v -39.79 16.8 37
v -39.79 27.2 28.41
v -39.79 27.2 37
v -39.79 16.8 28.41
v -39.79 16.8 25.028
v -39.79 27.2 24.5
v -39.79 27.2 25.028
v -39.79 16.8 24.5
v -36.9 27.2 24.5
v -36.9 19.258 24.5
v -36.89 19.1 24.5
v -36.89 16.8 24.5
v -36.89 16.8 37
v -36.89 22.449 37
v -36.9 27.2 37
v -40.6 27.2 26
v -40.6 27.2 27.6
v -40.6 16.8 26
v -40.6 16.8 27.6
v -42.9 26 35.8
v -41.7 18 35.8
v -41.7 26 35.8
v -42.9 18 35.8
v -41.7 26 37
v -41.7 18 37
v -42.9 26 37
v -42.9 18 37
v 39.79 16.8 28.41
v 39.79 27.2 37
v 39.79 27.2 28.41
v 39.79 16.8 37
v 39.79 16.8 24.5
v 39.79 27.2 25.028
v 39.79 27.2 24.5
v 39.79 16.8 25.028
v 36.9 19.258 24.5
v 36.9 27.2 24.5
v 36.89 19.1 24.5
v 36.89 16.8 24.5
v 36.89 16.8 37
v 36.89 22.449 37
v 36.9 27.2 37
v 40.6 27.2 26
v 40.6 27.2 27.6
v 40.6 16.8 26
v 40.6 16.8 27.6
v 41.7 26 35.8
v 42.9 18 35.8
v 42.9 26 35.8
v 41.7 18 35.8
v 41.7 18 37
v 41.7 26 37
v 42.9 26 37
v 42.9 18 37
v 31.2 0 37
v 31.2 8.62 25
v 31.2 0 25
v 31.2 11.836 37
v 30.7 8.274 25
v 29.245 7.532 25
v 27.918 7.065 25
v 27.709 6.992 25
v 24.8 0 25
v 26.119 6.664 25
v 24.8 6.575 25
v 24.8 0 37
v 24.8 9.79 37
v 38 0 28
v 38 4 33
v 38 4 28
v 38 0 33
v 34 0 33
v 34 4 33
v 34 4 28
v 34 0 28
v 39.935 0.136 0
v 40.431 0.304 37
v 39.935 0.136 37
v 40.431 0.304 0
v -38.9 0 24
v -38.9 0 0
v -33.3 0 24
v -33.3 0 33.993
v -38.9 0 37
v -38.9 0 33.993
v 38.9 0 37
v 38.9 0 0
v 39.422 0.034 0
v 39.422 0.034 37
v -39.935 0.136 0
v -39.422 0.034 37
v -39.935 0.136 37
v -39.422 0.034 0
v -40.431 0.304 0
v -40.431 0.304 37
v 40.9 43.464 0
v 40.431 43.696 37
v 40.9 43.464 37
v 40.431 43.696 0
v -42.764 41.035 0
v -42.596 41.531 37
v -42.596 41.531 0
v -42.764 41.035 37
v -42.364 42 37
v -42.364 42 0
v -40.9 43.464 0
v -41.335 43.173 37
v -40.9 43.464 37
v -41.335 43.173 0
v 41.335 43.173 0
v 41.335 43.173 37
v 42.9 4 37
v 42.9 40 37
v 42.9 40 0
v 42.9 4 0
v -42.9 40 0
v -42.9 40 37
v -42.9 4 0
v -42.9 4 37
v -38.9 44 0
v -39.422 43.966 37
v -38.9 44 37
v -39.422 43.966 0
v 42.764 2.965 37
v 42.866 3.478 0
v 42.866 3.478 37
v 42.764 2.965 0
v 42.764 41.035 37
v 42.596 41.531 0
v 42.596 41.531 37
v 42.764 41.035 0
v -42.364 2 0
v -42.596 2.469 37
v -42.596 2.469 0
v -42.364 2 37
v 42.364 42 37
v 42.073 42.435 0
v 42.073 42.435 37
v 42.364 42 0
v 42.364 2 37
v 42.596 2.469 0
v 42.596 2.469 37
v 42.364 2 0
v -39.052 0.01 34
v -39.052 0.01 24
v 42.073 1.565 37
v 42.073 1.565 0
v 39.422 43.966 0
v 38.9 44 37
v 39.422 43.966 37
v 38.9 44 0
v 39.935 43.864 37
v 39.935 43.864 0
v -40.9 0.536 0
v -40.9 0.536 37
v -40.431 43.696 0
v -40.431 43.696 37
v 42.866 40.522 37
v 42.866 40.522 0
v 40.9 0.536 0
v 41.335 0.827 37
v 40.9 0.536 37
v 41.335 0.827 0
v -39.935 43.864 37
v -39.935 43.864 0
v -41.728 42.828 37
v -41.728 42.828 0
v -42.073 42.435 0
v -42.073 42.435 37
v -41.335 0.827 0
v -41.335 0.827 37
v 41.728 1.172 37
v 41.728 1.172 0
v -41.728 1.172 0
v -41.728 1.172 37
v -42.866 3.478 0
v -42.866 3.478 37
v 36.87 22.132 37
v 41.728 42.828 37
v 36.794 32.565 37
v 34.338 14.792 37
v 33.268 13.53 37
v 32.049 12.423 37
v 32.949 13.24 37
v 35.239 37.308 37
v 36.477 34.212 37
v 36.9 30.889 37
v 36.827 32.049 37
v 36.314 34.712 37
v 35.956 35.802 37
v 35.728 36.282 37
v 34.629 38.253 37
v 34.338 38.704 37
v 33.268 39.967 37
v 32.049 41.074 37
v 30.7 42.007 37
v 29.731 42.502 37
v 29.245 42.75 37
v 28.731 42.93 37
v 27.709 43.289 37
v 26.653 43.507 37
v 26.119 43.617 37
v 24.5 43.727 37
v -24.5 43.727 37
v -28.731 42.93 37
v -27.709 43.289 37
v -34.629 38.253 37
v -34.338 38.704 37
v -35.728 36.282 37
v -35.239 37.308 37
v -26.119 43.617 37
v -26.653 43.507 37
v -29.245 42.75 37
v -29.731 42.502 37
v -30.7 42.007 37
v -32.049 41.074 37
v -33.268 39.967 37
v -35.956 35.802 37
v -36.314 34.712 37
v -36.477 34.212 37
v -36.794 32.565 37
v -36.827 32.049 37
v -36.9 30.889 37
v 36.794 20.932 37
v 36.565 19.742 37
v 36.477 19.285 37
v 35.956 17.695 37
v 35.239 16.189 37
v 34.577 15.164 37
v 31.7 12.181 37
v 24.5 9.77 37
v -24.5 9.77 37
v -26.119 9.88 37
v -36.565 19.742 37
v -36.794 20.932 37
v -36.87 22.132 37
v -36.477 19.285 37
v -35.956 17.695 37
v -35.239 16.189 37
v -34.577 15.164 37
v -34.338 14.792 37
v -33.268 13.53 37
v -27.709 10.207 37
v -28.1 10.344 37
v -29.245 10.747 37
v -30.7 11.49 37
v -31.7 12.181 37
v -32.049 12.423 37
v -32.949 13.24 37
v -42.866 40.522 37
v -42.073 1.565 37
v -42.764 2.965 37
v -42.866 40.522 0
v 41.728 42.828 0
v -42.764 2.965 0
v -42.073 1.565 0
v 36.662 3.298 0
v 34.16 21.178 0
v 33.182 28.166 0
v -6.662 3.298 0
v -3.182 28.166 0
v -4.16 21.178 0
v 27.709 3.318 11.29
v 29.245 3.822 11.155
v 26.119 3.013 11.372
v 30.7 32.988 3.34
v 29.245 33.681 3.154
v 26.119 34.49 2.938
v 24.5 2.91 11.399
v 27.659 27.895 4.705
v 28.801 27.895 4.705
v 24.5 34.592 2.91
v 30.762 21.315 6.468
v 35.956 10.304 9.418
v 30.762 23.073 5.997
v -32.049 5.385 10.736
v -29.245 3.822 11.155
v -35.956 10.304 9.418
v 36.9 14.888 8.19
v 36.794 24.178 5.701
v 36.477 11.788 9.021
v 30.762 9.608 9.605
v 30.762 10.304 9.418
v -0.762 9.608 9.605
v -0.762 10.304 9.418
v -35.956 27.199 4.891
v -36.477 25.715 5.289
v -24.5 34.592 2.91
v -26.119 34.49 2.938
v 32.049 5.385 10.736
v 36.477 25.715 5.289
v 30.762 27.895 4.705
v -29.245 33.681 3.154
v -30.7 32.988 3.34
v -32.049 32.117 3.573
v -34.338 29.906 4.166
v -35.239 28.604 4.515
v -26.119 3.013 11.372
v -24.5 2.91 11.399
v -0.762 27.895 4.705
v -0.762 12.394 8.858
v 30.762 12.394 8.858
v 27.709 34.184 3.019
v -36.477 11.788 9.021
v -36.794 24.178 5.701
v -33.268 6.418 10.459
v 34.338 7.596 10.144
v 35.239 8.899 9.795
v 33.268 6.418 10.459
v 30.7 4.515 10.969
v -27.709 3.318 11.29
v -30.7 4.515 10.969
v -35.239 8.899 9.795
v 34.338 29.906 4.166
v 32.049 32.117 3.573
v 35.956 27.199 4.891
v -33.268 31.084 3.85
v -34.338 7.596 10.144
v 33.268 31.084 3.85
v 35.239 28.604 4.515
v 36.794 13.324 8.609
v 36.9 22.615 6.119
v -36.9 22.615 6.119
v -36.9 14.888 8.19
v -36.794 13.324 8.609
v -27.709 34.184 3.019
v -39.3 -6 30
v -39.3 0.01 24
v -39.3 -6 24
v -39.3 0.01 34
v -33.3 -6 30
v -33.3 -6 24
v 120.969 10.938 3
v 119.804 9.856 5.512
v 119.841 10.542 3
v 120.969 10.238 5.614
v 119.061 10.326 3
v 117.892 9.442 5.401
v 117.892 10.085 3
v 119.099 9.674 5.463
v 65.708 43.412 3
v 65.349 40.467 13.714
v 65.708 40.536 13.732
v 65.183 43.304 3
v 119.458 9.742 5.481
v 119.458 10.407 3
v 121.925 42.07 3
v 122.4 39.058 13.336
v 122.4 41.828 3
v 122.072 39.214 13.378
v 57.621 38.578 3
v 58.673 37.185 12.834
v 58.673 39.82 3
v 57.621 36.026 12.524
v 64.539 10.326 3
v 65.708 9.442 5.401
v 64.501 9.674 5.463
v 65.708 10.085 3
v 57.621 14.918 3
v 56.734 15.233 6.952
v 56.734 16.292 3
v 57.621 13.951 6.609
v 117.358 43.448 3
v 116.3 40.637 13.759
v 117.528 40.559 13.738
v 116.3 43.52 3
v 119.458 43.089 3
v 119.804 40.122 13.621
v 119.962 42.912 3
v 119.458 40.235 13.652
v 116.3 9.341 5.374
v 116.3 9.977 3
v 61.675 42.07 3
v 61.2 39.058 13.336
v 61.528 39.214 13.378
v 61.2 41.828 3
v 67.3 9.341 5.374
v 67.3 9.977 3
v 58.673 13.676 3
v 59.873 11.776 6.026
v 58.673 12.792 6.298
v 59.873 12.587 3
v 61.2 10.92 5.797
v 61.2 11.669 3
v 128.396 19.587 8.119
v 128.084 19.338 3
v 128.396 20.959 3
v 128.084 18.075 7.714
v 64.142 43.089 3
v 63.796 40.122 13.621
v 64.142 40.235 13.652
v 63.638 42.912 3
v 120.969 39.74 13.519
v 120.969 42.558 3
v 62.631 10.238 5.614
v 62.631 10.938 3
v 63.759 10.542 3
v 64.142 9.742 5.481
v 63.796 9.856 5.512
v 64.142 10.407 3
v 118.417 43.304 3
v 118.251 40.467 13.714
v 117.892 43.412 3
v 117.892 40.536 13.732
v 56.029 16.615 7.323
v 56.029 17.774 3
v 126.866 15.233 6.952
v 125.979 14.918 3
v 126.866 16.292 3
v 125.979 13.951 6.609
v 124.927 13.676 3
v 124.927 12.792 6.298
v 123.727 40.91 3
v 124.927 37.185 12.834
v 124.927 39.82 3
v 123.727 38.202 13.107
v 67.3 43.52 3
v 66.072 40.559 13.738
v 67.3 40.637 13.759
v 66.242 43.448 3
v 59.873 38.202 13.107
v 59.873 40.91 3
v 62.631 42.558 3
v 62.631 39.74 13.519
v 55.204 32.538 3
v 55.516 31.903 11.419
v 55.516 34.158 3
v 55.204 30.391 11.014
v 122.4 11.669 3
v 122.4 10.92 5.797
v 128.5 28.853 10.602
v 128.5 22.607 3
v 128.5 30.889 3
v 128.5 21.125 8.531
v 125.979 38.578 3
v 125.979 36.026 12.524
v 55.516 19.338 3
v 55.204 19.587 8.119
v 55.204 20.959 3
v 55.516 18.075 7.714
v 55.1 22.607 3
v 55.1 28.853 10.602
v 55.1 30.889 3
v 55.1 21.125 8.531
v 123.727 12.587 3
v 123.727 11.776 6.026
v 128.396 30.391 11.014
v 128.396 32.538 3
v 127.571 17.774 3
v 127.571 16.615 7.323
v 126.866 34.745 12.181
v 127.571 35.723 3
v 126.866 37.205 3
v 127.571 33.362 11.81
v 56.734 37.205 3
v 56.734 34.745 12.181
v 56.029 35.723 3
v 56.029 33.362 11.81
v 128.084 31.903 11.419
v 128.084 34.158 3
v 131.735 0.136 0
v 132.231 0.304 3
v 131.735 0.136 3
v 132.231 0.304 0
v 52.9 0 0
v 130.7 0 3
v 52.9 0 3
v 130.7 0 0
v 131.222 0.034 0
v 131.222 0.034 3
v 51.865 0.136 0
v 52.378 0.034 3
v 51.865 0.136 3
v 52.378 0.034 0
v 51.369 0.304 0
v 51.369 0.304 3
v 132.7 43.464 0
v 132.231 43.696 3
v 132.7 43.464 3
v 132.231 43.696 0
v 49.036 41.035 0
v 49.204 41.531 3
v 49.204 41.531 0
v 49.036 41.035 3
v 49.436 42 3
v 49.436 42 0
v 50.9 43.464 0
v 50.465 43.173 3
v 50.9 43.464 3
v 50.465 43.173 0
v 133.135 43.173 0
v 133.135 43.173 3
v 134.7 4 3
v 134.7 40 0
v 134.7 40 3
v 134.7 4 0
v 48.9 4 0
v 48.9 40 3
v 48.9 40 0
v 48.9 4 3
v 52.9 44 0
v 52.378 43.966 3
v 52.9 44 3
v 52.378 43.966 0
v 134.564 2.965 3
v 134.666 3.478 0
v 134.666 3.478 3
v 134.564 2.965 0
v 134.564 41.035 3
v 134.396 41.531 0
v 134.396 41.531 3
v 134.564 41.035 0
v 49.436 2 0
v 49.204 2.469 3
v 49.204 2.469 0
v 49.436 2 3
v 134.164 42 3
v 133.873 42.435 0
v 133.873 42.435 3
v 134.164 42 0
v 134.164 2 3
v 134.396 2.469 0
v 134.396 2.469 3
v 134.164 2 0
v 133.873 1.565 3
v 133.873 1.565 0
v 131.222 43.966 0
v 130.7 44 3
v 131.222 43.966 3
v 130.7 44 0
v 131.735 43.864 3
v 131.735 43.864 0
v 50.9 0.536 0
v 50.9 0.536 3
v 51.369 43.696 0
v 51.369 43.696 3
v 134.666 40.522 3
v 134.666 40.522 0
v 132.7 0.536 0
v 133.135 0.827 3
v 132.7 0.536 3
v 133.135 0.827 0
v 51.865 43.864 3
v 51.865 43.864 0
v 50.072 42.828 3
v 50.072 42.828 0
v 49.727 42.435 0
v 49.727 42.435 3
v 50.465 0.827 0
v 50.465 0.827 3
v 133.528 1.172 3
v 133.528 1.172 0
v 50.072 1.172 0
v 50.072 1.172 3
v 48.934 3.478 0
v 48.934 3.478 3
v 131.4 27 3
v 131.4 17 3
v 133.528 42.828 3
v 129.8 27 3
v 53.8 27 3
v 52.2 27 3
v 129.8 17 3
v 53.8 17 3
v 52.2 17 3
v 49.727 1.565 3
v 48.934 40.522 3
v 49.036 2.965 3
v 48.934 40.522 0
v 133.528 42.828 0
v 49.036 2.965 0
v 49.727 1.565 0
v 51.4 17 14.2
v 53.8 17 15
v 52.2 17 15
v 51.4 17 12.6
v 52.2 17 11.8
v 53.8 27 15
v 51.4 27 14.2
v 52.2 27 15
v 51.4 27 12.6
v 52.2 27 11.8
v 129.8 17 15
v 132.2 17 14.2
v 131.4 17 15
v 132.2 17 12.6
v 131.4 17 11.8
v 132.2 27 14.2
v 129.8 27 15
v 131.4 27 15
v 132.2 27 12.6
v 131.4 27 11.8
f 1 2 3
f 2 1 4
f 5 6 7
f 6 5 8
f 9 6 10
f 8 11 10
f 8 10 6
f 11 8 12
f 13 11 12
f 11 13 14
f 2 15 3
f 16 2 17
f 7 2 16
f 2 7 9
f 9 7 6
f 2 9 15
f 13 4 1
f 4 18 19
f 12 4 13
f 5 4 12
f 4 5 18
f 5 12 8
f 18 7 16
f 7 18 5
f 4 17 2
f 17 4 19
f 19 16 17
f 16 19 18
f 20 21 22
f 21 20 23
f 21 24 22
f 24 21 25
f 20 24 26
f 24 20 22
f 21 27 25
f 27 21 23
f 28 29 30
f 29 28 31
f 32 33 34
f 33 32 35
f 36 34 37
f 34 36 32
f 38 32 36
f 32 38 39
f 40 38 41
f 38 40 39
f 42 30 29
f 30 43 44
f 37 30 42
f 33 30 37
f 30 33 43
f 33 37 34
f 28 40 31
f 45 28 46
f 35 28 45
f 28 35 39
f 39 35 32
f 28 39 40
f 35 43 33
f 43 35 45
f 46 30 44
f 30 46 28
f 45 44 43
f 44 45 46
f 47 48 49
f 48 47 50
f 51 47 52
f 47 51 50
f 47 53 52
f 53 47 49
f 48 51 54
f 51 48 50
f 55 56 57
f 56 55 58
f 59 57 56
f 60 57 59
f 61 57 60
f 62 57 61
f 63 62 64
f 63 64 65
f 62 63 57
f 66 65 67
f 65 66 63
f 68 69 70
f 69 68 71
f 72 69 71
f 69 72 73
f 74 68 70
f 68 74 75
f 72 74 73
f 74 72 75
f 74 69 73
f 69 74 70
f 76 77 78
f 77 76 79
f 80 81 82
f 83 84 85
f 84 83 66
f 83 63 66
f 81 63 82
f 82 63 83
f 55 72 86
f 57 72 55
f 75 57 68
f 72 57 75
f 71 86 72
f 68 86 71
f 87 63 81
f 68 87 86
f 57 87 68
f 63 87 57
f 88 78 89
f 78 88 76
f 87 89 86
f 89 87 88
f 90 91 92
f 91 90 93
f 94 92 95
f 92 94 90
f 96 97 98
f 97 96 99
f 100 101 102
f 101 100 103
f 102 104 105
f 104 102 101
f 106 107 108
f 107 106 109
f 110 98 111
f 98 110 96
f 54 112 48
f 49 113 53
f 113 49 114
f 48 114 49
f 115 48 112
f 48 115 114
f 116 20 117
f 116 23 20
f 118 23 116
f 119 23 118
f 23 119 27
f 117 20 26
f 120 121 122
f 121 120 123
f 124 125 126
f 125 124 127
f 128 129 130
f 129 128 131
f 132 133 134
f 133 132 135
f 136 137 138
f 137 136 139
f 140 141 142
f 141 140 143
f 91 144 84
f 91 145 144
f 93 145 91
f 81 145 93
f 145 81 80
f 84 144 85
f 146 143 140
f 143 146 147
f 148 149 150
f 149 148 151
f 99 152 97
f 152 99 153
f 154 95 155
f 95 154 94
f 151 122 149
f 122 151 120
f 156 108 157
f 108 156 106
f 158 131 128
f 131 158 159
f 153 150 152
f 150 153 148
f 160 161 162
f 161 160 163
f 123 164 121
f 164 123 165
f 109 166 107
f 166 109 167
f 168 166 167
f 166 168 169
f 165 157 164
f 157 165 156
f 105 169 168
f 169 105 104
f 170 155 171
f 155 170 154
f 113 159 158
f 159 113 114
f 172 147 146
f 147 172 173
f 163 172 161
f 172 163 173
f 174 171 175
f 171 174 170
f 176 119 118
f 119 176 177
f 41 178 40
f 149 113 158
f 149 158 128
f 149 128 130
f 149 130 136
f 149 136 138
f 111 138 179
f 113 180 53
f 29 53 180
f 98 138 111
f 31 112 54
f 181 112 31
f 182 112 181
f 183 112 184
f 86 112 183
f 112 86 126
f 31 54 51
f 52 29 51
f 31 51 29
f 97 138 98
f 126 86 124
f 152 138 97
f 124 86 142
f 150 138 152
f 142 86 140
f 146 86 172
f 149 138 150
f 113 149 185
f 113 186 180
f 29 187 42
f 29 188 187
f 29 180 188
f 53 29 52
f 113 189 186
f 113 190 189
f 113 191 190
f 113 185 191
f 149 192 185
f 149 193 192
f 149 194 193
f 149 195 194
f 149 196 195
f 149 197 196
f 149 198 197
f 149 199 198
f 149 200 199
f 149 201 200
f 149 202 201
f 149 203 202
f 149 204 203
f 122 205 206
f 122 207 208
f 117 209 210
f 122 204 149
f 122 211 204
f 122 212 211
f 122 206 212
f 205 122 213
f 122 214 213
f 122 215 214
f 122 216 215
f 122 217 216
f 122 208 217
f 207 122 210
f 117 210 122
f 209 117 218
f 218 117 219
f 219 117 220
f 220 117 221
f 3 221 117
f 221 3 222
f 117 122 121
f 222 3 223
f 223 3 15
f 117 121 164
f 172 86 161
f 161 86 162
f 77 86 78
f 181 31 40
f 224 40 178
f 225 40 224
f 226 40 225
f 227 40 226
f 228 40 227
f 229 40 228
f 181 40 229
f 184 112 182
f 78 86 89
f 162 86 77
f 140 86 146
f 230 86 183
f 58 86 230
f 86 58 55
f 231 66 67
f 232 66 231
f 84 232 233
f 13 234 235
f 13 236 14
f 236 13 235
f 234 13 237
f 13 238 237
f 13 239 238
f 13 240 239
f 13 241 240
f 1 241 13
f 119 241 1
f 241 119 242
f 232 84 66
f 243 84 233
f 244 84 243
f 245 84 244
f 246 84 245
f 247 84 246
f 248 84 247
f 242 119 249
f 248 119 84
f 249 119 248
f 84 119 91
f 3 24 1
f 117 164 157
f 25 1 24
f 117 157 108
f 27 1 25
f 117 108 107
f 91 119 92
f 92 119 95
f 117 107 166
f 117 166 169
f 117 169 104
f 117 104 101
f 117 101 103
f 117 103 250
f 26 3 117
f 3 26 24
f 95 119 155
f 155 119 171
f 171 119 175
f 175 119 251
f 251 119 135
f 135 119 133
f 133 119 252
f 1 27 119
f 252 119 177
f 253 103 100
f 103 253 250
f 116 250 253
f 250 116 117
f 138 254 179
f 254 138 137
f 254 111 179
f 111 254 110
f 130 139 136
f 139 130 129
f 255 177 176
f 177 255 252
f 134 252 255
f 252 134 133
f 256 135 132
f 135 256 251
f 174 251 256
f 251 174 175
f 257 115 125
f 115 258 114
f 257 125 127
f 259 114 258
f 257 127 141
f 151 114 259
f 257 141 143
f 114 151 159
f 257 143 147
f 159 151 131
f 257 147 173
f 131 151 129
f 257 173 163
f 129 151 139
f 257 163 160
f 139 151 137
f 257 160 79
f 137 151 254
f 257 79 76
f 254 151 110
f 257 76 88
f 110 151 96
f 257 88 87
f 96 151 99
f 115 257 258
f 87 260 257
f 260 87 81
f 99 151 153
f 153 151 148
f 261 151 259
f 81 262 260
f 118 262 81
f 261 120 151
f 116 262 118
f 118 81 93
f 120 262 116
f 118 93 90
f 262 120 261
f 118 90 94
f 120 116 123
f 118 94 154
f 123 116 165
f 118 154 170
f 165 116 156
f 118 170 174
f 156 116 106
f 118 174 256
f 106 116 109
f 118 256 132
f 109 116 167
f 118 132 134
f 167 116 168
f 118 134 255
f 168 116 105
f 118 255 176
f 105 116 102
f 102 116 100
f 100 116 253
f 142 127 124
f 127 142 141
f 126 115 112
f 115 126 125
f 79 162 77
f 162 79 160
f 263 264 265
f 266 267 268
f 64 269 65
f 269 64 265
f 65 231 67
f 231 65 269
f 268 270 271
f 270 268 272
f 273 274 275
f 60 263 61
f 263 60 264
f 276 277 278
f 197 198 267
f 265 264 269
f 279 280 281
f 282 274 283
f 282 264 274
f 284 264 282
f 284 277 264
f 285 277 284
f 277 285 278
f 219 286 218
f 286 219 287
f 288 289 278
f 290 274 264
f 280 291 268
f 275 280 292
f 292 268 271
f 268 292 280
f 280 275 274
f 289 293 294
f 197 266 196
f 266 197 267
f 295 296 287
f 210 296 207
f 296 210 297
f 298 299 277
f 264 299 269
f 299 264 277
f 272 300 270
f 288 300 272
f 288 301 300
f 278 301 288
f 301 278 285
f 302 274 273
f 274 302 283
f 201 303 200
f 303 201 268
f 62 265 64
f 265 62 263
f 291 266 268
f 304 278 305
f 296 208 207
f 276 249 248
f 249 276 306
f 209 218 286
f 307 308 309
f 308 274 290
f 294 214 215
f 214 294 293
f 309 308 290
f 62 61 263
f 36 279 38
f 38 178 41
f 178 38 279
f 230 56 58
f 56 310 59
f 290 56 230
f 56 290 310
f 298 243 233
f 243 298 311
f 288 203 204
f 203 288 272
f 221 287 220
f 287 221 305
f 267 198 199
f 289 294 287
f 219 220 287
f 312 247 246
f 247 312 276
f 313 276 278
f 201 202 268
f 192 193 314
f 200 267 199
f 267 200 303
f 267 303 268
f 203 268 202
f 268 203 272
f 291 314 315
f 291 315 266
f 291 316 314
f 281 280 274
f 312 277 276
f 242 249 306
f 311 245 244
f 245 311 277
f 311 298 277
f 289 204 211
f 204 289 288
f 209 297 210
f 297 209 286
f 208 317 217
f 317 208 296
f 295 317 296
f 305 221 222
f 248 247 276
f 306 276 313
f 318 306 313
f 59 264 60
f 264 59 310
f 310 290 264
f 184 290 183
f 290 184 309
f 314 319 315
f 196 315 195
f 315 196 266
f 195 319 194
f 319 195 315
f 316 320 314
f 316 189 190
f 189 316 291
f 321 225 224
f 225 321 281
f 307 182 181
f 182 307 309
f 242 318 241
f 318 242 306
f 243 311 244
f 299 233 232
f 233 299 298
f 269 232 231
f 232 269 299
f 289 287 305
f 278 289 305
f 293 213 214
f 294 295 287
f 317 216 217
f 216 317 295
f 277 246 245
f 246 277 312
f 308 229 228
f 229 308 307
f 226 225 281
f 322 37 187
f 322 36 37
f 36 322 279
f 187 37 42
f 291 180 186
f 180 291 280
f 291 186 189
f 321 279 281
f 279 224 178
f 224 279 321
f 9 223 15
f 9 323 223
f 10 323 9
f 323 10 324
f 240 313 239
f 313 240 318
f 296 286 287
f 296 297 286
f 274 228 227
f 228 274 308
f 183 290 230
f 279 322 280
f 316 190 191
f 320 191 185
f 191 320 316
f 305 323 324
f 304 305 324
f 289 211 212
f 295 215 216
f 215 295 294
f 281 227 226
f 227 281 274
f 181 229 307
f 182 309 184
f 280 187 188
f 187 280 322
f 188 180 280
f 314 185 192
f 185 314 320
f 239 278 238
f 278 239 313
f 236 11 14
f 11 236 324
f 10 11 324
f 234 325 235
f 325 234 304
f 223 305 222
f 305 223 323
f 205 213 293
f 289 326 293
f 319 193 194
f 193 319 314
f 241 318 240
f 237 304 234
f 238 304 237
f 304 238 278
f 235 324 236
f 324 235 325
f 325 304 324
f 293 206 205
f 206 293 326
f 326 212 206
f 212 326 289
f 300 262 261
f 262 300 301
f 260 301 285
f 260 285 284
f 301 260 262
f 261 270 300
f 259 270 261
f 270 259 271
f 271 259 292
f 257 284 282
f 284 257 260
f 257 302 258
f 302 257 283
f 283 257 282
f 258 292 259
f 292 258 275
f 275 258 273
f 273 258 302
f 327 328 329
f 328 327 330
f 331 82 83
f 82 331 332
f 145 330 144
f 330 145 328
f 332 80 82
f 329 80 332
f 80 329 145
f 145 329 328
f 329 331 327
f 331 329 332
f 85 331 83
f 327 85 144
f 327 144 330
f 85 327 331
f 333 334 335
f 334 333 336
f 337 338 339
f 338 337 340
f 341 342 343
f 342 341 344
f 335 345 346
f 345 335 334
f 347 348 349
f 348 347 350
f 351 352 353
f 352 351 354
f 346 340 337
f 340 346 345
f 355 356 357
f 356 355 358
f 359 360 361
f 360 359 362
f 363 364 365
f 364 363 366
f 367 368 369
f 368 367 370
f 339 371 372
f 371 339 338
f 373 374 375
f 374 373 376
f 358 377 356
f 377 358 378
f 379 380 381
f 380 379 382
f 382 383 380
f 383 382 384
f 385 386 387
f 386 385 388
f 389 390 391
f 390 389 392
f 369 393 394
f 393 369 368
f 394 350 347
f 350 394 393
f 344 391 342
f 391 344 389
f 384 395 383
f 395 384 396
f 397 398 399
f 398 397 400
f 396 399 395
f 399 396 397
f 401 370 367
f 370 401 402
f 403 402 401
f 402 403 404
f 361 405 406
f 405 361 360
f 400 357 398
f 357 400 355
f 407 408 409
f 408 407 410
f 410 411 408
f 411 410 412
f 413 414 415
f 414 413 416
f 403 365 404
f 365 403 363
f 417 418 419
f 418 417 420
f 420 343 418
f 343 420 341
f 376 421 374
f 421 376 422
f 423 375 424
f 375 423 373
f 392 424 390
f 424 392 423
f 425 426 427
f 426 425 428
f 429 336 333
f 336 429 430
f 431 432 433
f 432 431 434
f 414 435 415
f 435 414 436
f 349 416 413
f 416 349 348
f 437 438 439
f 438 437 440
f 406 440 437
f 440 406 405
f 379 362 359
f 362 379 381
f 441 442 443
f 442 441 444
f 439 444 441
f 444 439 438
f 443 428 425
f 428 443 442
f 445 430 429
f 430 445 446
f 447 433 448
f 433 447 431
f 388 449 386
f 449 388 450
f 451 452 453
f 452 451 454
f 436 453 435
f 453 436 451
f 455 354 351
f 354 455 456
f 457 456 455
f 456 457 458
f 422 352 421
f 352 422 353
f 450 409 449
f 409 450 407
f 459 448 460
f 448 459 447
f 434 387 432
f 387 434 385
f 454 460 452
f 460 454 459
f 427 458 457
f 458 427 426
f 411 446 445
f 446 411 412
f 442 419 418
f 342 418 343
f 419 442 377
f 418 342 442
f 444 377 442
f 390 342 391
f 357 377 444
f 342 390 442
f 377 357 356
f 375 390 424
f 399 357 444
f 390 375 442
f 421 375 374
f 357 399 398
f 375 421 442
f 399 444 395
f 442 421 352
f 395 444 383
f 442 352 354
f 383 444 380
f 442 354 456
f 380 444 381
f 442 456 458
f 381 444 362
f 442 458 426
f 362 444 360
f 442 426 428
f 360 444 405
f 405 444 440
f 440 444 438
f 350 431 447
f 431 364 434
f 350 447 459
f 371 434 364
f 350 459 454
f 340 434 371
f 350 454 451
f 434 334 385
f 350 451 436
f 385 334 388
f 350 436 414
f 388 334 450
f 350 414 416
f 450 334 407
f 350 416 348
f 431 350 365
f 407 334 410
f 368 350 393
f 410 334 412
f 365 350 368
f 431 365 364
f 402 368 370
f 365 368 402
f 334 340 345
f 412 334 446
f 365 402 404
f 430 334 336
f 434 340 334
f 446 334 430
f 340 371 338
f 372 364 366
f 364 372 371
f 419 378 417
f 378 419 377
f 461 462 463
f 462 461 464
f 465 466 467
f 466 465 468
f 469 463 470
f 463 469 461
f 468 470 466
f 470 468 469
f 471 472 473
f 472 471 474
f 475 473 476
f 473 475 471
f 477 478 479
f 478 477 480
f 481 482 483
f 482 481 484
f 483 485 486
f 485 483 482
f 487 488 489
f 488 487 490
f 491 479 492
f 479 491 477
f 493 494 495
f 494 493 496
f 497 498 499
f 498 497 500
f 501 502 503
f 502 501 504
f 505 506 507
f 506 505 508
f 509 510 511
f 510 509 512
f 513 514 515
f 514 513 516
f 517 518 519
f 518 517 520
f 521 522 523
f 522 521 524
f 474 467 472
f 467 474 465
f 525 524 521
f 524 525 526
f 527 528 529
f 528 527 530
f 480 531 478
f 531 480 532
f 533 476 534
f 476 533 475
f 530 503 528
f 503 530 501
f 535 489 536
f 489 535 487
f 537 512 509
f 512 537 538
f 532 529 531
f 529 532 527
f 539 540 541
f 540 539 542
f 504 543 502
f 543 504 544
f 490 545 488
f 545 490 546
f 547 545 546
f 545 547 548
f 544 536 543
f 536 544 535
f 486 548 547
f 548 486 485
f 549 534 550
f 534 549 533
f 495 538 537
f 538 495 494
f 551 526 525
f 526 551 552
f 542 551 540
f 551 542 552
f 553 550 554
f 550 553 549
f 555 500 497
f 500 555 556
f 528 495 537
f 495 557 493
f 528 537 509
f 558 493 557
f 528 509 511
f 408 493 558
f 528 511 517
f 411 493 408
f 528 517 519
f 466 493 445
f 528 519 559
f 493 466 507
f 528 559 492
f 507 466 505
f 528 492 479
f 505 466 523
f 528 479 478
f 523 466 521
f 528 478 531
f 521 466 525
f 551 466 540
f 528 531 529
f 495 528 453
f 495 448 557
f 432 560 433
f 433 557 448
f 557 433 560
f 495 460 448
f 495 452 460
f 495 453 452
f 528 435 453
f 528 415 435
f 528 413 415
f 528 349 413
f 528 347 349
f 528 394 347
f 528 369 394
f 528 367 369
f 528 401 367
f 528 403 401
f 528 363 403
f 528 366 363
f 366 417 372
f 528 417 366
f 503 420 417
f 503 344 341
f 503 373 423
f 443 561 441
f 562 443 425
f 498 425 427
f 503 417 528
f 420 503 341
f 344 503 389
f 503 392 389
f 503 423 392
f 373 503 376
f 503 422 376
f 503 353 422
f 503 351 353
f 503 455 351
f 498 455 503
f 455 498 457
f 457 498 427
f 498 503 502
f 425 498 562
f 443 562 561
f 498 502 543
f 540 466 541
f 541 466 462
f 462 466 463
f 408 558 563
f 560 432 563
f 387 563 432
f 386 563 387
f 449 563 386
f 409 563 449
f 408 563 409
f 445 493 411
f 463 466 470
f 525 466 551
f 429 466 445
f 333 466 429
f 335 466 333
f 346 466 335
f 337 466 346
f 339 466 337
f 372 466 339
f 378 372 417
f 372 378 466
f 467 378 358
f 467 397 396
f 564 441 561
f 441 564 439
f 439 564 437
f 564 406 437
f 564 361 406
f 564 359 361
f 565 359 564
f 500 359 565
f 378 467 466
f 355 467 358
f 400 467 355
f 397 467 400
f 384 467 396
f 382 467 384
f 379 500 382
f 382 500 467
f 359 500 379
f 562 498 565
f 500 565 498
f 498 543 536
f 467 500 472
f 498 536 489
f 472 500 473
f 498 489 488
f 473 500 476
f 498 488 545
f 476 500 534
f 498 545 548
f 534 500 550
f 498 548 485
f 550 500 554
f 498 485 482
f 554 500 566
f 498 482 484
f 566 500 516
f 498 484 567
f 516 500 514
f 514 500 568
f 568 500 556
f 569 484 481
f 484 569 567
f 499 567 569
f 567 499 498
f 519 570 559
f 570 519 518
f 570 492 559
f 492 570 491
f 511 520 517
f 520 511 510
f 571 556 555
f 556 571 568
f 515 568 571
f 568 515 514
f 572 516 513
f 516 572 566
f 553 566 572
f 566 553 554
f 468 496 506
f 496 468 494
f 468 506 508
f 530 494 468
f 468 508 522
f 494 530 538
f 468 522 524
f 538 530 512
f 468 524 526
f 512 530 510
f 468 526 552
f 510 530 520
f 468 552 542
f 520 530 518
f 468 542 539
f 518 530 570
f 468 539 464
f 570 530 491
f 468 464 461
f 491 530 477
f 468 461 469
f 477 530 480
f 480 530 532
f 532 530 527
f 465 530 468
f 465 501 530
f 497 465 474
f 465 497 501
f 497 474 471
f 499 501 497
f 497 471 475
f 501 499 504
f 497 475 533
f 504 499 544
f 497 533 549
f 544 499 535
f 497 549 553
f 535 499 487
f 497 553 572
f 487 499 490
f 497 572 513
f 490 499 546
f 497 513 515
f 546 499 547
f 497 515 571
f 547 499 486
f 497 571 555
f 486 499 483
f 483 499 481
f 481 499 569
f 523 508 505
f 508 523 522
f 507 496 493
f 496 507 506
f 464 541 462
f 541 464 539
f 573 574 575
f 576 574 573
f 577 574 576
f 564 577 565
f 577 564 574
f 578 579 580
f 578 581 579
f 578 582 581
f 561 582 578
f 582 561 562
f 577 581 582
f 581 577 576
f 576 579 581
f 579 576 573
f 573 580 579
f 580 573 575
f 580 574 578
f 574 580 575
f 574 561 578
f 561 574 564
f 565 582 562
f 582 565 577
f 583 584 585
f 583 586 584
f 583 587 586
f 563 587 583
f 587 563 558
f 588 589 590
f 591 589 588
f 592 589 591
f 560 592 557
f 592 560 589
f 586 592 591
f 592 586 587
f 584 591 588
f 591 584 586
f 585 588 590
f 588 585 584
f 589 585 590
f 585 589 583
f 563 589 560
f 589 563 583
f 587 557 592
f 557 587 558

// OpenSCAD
// =====================================================================
// Logitech C270 webcam box for the P4 LED frame (top-centre, looks 15 deg down)
// Camera with its clip removed slides in from the back; the lid CLICKS shut
// (two snap tongues in the side walls) and its pads lock the camera. Two mounts:
//   mount = "clip" : peg into the window of the standard middle top rail + 1 zip tie
//   mount = "rail" : 2 x M3 into the pads of the full-frame top-mount rail
// part = "body" | "lid" | "plate" | "assembly"
// Print the body FRONT-DOWN (window on the bed), the lid outer-face-down. No supports.
// Default camera size = C270 body WITHOUT clip - measure yours and adjust cam_*.
// =====================================================================
part  = "plate";
mount = "clip";

cam_w = 73.0;   cam_h = 32.0;   cam_d = 24.0;   cam_r = 12;  // body (pill-shaped ends, from the photo); depth assumed - measure
lens_dx = 15;   lens_dy = 0;    // lens sits 15 mm off-centre (to the left seen from the front), from the photo
cl    = 0.4;    tilt = 15;      // pocket clearance, look-down angle
fov_h = 24.4 + 4;  fov_v = 14.3 + 4;   // half angles (55 deg dFOV, 16:9) + margin

// snap fit: tongues on the lid flex into slots in the thick side walls
snap_x0 = cam_w/2 + cl;        // slot opens onto the camera channel (tongue can flex inward)
tng_t = 1.6;  tng_w = 10;  tng_l = 12;  bump = 0.8;  snap_cl = 0.2;
tng_x = snap_x0 + 1.1;         // tongue inner face
wall = 2.6;  front_t = 2.4;  floor_t = 3;  roof_t = 2.5;  lid_t = 3;  press = 0.3;
W  = cam_w + 2*cl + 2*6;       // side walls thick enough for the lid screws
// camera front-face centre in box coords (x centred, y up from the frame top edge, z from the front face)
zf = front_t + cl + (cam_h/2)*sin(tilt) + 0.6;
yc = floor_t + cl + (cam_h/2)*cos(tilt);
Db = ceil(zf + (cam_h/2)*sin(tilt) + cam_d*cos(tilt) + cl + 1);    // body depth (lid on top)
Hb = ceil(yc + (cam_h/2)*cos(tilt) + cam_d*sin(tilt) + cl + roof_t);
D  = Db + lid_t;
echo(str("C270 box: ", W, " x ", Hb, " x ", D, " mm (w x h x depth)"));

// frame interface (matches p4_frame_v3: 46 mm frame, middle top rail)
z_front = -18;                 // frame z of the box front face (panel face is at -14)
peg_x = -36.3;   cab_x = 28;   // clip mount: peg window left of centre, cable window right of centre
pad_x = 16;      pad_z = 10;   // rail mount: screw pads of rail_top_mount

$fn = 48;
module rr(w, h, r) { offset(r) square([w-2*r, h-2*r], center=true); }
module cam_tf() { translate([lens_dx*0, yc, zf]) rotate([-tilt,0,0]) children(); }   // camera frame: front-face centre, +z = backwards
module cam_body(extra=0, back=0) {      // camera envelope (+ sweep out of the back for insertion)
  cam_tf() translate([0,0,-extra]) linear_extrude(cam_d + 2*extra + back) rr(cam_w+2*extra, cam_h+2*extra, cam_r+extra);
}
module teardrop2d(r) { hull() { circle(r=r); polygon([[-r*0.7071, r*0.7071],[r*0.7071, r*0.7071],[0, r*1.4142]]); } }
module lid_screws() { for (sx=[-1,1], yy=[6, Hb-6]) translate([sx*(W/2-3.2), yy]) children(); }

module body() {
  difference() {
    translate([0, Hb/2, 0]) linear_extrude(Db) rr(W, Hb, 4);
    cam_body(cl, 80);                                                  // pocket + back insertion sweep
    // lens window: flares at the field of view (plus margin) toward the outside
    cam_tf() translate([lens_dx, lens_dy, 0]) hull() {
      translate([0,0,1]) linear_extrude(0.01) square([30, 18], center=true);
      translate([0,0,-12]) linear_extrude(0.01) square([30 + 2*13*tan(fov_h), 18 + 2*13*tan(fov_v)], center=true);
    }
    for (sx=[-1,1]) mirror([sx<0 ? 1 : 0,0,0]) {
      // tongue slot from the back face, open to the camera channel
      translate([snap_x0-0.01, Hb/2-tng_w/2-snap_cl, Db-tng_l-0.5]) cube([tng_x+tng_t+snap_cl-snap_x0, tng_w+2*snap_cl, tng_l+1]);
      // catch: 45 deg on both sides -> clicks in, prints without support, opens with a firm pull
      translate([0, Hb/2-tng_w/2-snap_cl, 0]) rotate([90,0,0]) mirror([0,0,1]) linear_extrude(tng_w+2*snap_cl)
        translate([tng_x+tng_t, Db]) polygon([[0,-tng_l-0.2],[bump+snap_cl,-tng_l+bump+0.2-0.2+snap_cl],[bump+snap_cl,-tng_l+bump+1.6+snap_cl],[0,-tng_l+2*bump+1.6+2*snap_cl]]);
      // pry notch at the lid edge
      translate([W/2-1.2, Hb/2-4, Db-1.2]) cube([2, 8, 2]);
    }
    if (mount == "clip") {
      // cable channel down to the rail window, open to the lid (lay the cable in, plug stays outside the box)
      translate([cab_x-3.2, -1, Db-12]) cube([6.4, yc, 13]);
      translate([cab_x+6, -1, Db-9]) cube([4, floor_t+2, 5]);       // zip-tie slot
    } else {
      translate([-3.2, -1, Db-14]) cube([6.4, yc, 15]);              // cable channel into the rail's centre window
      for (sx=[-1,1]) {                                               // M3 into the rail pads + driver access through the roof
        translate([sx*pad_x, floor_t+1, pad_z - z_front]) rotate([90,0,0]) linear_extrude(floor_t+2) teardrop2d(1.7);
        translate([sx*pad_x, Hb+1, pad_z - z_front]) rotate([90,0,0]) linear_extrude(roof_t+2) teardrop2d(3.2);
      }
    }
  }
  if (mount == "clip")   // peg down into the rail window (frame z 6..16 at the root, 45 deg back face)
    translate([peg_x, 0, 0]) rotate([0,90,0]) rotate([0,0,90]) linear_extrude(6, center=true)
      polygon([[0.01, 6-z_front],[0.01, 16-z_front],[-6, 12-z_front],[-6, 6-z_front]]);
}

module lid() {
  difference() {
    union() {
      translate([0, Hb/2, 0]) linear_extrude(lid_t) rr(W, Hb, 4);
      // pusher pads at both ends of the camera (centre left free for the cable): fill the sweep behind the camera
      intersection() {
        translate([0,0,lid_t+Db]) mirror([0,0,1]) difference() {
          intersection() {
            cam_body(cl-0.2, 80);                                     // the insertion channel behind the camera
            cam_tf() translate([-100,-100,cam_d-press]) cube([200,200,200]);   // starts press mm INSIDE the camera back
          }
          translate([-cam_w/2+12, -50, -50]) cube([cam_w-24, 200, 200]);    // centre left free for the cable
        }
        translate([-W/2, 0, lid_t-0.01]) cube([W, Hb, Db]);
      }
    }
  }
  for (sx=[-1,1]) mirror([sx<0 ? 1 : 0,0,0]) translate([0, Hb/2-tng_w/2, 0]) rotate([90,0,0]) mirror([0,0,1]) linear_extrude(tng_w)
    polygon([[tng_x, lid_t-0.01],[tng_x+tng_t, lid_t-0.01],
             [tng_x+tng_t, lid_t+tng_l-2*bump-1.6],[tng_x+tng_t+bump, lid_t+tng_l-bump-1.6],
             [tng_x+tng_t+bump, lid_t+tng_l-bump],[tng_x+tng_t, lid_t+tng_l],[tng_x, lid_t+tng_l]]);
}

if (part == "body") body();
else if (part == "lid") lid();
else if (part == "plate") { body(); translate([W+6, 0, 0]) lid(); }
else {                      // assembly preview in box coords
  color("Orange") body();
  color("Gold") translate([0,0,D]) mirror([0,0,1]) lid();
  color("DimGray") cam_body(0, 0);
}
